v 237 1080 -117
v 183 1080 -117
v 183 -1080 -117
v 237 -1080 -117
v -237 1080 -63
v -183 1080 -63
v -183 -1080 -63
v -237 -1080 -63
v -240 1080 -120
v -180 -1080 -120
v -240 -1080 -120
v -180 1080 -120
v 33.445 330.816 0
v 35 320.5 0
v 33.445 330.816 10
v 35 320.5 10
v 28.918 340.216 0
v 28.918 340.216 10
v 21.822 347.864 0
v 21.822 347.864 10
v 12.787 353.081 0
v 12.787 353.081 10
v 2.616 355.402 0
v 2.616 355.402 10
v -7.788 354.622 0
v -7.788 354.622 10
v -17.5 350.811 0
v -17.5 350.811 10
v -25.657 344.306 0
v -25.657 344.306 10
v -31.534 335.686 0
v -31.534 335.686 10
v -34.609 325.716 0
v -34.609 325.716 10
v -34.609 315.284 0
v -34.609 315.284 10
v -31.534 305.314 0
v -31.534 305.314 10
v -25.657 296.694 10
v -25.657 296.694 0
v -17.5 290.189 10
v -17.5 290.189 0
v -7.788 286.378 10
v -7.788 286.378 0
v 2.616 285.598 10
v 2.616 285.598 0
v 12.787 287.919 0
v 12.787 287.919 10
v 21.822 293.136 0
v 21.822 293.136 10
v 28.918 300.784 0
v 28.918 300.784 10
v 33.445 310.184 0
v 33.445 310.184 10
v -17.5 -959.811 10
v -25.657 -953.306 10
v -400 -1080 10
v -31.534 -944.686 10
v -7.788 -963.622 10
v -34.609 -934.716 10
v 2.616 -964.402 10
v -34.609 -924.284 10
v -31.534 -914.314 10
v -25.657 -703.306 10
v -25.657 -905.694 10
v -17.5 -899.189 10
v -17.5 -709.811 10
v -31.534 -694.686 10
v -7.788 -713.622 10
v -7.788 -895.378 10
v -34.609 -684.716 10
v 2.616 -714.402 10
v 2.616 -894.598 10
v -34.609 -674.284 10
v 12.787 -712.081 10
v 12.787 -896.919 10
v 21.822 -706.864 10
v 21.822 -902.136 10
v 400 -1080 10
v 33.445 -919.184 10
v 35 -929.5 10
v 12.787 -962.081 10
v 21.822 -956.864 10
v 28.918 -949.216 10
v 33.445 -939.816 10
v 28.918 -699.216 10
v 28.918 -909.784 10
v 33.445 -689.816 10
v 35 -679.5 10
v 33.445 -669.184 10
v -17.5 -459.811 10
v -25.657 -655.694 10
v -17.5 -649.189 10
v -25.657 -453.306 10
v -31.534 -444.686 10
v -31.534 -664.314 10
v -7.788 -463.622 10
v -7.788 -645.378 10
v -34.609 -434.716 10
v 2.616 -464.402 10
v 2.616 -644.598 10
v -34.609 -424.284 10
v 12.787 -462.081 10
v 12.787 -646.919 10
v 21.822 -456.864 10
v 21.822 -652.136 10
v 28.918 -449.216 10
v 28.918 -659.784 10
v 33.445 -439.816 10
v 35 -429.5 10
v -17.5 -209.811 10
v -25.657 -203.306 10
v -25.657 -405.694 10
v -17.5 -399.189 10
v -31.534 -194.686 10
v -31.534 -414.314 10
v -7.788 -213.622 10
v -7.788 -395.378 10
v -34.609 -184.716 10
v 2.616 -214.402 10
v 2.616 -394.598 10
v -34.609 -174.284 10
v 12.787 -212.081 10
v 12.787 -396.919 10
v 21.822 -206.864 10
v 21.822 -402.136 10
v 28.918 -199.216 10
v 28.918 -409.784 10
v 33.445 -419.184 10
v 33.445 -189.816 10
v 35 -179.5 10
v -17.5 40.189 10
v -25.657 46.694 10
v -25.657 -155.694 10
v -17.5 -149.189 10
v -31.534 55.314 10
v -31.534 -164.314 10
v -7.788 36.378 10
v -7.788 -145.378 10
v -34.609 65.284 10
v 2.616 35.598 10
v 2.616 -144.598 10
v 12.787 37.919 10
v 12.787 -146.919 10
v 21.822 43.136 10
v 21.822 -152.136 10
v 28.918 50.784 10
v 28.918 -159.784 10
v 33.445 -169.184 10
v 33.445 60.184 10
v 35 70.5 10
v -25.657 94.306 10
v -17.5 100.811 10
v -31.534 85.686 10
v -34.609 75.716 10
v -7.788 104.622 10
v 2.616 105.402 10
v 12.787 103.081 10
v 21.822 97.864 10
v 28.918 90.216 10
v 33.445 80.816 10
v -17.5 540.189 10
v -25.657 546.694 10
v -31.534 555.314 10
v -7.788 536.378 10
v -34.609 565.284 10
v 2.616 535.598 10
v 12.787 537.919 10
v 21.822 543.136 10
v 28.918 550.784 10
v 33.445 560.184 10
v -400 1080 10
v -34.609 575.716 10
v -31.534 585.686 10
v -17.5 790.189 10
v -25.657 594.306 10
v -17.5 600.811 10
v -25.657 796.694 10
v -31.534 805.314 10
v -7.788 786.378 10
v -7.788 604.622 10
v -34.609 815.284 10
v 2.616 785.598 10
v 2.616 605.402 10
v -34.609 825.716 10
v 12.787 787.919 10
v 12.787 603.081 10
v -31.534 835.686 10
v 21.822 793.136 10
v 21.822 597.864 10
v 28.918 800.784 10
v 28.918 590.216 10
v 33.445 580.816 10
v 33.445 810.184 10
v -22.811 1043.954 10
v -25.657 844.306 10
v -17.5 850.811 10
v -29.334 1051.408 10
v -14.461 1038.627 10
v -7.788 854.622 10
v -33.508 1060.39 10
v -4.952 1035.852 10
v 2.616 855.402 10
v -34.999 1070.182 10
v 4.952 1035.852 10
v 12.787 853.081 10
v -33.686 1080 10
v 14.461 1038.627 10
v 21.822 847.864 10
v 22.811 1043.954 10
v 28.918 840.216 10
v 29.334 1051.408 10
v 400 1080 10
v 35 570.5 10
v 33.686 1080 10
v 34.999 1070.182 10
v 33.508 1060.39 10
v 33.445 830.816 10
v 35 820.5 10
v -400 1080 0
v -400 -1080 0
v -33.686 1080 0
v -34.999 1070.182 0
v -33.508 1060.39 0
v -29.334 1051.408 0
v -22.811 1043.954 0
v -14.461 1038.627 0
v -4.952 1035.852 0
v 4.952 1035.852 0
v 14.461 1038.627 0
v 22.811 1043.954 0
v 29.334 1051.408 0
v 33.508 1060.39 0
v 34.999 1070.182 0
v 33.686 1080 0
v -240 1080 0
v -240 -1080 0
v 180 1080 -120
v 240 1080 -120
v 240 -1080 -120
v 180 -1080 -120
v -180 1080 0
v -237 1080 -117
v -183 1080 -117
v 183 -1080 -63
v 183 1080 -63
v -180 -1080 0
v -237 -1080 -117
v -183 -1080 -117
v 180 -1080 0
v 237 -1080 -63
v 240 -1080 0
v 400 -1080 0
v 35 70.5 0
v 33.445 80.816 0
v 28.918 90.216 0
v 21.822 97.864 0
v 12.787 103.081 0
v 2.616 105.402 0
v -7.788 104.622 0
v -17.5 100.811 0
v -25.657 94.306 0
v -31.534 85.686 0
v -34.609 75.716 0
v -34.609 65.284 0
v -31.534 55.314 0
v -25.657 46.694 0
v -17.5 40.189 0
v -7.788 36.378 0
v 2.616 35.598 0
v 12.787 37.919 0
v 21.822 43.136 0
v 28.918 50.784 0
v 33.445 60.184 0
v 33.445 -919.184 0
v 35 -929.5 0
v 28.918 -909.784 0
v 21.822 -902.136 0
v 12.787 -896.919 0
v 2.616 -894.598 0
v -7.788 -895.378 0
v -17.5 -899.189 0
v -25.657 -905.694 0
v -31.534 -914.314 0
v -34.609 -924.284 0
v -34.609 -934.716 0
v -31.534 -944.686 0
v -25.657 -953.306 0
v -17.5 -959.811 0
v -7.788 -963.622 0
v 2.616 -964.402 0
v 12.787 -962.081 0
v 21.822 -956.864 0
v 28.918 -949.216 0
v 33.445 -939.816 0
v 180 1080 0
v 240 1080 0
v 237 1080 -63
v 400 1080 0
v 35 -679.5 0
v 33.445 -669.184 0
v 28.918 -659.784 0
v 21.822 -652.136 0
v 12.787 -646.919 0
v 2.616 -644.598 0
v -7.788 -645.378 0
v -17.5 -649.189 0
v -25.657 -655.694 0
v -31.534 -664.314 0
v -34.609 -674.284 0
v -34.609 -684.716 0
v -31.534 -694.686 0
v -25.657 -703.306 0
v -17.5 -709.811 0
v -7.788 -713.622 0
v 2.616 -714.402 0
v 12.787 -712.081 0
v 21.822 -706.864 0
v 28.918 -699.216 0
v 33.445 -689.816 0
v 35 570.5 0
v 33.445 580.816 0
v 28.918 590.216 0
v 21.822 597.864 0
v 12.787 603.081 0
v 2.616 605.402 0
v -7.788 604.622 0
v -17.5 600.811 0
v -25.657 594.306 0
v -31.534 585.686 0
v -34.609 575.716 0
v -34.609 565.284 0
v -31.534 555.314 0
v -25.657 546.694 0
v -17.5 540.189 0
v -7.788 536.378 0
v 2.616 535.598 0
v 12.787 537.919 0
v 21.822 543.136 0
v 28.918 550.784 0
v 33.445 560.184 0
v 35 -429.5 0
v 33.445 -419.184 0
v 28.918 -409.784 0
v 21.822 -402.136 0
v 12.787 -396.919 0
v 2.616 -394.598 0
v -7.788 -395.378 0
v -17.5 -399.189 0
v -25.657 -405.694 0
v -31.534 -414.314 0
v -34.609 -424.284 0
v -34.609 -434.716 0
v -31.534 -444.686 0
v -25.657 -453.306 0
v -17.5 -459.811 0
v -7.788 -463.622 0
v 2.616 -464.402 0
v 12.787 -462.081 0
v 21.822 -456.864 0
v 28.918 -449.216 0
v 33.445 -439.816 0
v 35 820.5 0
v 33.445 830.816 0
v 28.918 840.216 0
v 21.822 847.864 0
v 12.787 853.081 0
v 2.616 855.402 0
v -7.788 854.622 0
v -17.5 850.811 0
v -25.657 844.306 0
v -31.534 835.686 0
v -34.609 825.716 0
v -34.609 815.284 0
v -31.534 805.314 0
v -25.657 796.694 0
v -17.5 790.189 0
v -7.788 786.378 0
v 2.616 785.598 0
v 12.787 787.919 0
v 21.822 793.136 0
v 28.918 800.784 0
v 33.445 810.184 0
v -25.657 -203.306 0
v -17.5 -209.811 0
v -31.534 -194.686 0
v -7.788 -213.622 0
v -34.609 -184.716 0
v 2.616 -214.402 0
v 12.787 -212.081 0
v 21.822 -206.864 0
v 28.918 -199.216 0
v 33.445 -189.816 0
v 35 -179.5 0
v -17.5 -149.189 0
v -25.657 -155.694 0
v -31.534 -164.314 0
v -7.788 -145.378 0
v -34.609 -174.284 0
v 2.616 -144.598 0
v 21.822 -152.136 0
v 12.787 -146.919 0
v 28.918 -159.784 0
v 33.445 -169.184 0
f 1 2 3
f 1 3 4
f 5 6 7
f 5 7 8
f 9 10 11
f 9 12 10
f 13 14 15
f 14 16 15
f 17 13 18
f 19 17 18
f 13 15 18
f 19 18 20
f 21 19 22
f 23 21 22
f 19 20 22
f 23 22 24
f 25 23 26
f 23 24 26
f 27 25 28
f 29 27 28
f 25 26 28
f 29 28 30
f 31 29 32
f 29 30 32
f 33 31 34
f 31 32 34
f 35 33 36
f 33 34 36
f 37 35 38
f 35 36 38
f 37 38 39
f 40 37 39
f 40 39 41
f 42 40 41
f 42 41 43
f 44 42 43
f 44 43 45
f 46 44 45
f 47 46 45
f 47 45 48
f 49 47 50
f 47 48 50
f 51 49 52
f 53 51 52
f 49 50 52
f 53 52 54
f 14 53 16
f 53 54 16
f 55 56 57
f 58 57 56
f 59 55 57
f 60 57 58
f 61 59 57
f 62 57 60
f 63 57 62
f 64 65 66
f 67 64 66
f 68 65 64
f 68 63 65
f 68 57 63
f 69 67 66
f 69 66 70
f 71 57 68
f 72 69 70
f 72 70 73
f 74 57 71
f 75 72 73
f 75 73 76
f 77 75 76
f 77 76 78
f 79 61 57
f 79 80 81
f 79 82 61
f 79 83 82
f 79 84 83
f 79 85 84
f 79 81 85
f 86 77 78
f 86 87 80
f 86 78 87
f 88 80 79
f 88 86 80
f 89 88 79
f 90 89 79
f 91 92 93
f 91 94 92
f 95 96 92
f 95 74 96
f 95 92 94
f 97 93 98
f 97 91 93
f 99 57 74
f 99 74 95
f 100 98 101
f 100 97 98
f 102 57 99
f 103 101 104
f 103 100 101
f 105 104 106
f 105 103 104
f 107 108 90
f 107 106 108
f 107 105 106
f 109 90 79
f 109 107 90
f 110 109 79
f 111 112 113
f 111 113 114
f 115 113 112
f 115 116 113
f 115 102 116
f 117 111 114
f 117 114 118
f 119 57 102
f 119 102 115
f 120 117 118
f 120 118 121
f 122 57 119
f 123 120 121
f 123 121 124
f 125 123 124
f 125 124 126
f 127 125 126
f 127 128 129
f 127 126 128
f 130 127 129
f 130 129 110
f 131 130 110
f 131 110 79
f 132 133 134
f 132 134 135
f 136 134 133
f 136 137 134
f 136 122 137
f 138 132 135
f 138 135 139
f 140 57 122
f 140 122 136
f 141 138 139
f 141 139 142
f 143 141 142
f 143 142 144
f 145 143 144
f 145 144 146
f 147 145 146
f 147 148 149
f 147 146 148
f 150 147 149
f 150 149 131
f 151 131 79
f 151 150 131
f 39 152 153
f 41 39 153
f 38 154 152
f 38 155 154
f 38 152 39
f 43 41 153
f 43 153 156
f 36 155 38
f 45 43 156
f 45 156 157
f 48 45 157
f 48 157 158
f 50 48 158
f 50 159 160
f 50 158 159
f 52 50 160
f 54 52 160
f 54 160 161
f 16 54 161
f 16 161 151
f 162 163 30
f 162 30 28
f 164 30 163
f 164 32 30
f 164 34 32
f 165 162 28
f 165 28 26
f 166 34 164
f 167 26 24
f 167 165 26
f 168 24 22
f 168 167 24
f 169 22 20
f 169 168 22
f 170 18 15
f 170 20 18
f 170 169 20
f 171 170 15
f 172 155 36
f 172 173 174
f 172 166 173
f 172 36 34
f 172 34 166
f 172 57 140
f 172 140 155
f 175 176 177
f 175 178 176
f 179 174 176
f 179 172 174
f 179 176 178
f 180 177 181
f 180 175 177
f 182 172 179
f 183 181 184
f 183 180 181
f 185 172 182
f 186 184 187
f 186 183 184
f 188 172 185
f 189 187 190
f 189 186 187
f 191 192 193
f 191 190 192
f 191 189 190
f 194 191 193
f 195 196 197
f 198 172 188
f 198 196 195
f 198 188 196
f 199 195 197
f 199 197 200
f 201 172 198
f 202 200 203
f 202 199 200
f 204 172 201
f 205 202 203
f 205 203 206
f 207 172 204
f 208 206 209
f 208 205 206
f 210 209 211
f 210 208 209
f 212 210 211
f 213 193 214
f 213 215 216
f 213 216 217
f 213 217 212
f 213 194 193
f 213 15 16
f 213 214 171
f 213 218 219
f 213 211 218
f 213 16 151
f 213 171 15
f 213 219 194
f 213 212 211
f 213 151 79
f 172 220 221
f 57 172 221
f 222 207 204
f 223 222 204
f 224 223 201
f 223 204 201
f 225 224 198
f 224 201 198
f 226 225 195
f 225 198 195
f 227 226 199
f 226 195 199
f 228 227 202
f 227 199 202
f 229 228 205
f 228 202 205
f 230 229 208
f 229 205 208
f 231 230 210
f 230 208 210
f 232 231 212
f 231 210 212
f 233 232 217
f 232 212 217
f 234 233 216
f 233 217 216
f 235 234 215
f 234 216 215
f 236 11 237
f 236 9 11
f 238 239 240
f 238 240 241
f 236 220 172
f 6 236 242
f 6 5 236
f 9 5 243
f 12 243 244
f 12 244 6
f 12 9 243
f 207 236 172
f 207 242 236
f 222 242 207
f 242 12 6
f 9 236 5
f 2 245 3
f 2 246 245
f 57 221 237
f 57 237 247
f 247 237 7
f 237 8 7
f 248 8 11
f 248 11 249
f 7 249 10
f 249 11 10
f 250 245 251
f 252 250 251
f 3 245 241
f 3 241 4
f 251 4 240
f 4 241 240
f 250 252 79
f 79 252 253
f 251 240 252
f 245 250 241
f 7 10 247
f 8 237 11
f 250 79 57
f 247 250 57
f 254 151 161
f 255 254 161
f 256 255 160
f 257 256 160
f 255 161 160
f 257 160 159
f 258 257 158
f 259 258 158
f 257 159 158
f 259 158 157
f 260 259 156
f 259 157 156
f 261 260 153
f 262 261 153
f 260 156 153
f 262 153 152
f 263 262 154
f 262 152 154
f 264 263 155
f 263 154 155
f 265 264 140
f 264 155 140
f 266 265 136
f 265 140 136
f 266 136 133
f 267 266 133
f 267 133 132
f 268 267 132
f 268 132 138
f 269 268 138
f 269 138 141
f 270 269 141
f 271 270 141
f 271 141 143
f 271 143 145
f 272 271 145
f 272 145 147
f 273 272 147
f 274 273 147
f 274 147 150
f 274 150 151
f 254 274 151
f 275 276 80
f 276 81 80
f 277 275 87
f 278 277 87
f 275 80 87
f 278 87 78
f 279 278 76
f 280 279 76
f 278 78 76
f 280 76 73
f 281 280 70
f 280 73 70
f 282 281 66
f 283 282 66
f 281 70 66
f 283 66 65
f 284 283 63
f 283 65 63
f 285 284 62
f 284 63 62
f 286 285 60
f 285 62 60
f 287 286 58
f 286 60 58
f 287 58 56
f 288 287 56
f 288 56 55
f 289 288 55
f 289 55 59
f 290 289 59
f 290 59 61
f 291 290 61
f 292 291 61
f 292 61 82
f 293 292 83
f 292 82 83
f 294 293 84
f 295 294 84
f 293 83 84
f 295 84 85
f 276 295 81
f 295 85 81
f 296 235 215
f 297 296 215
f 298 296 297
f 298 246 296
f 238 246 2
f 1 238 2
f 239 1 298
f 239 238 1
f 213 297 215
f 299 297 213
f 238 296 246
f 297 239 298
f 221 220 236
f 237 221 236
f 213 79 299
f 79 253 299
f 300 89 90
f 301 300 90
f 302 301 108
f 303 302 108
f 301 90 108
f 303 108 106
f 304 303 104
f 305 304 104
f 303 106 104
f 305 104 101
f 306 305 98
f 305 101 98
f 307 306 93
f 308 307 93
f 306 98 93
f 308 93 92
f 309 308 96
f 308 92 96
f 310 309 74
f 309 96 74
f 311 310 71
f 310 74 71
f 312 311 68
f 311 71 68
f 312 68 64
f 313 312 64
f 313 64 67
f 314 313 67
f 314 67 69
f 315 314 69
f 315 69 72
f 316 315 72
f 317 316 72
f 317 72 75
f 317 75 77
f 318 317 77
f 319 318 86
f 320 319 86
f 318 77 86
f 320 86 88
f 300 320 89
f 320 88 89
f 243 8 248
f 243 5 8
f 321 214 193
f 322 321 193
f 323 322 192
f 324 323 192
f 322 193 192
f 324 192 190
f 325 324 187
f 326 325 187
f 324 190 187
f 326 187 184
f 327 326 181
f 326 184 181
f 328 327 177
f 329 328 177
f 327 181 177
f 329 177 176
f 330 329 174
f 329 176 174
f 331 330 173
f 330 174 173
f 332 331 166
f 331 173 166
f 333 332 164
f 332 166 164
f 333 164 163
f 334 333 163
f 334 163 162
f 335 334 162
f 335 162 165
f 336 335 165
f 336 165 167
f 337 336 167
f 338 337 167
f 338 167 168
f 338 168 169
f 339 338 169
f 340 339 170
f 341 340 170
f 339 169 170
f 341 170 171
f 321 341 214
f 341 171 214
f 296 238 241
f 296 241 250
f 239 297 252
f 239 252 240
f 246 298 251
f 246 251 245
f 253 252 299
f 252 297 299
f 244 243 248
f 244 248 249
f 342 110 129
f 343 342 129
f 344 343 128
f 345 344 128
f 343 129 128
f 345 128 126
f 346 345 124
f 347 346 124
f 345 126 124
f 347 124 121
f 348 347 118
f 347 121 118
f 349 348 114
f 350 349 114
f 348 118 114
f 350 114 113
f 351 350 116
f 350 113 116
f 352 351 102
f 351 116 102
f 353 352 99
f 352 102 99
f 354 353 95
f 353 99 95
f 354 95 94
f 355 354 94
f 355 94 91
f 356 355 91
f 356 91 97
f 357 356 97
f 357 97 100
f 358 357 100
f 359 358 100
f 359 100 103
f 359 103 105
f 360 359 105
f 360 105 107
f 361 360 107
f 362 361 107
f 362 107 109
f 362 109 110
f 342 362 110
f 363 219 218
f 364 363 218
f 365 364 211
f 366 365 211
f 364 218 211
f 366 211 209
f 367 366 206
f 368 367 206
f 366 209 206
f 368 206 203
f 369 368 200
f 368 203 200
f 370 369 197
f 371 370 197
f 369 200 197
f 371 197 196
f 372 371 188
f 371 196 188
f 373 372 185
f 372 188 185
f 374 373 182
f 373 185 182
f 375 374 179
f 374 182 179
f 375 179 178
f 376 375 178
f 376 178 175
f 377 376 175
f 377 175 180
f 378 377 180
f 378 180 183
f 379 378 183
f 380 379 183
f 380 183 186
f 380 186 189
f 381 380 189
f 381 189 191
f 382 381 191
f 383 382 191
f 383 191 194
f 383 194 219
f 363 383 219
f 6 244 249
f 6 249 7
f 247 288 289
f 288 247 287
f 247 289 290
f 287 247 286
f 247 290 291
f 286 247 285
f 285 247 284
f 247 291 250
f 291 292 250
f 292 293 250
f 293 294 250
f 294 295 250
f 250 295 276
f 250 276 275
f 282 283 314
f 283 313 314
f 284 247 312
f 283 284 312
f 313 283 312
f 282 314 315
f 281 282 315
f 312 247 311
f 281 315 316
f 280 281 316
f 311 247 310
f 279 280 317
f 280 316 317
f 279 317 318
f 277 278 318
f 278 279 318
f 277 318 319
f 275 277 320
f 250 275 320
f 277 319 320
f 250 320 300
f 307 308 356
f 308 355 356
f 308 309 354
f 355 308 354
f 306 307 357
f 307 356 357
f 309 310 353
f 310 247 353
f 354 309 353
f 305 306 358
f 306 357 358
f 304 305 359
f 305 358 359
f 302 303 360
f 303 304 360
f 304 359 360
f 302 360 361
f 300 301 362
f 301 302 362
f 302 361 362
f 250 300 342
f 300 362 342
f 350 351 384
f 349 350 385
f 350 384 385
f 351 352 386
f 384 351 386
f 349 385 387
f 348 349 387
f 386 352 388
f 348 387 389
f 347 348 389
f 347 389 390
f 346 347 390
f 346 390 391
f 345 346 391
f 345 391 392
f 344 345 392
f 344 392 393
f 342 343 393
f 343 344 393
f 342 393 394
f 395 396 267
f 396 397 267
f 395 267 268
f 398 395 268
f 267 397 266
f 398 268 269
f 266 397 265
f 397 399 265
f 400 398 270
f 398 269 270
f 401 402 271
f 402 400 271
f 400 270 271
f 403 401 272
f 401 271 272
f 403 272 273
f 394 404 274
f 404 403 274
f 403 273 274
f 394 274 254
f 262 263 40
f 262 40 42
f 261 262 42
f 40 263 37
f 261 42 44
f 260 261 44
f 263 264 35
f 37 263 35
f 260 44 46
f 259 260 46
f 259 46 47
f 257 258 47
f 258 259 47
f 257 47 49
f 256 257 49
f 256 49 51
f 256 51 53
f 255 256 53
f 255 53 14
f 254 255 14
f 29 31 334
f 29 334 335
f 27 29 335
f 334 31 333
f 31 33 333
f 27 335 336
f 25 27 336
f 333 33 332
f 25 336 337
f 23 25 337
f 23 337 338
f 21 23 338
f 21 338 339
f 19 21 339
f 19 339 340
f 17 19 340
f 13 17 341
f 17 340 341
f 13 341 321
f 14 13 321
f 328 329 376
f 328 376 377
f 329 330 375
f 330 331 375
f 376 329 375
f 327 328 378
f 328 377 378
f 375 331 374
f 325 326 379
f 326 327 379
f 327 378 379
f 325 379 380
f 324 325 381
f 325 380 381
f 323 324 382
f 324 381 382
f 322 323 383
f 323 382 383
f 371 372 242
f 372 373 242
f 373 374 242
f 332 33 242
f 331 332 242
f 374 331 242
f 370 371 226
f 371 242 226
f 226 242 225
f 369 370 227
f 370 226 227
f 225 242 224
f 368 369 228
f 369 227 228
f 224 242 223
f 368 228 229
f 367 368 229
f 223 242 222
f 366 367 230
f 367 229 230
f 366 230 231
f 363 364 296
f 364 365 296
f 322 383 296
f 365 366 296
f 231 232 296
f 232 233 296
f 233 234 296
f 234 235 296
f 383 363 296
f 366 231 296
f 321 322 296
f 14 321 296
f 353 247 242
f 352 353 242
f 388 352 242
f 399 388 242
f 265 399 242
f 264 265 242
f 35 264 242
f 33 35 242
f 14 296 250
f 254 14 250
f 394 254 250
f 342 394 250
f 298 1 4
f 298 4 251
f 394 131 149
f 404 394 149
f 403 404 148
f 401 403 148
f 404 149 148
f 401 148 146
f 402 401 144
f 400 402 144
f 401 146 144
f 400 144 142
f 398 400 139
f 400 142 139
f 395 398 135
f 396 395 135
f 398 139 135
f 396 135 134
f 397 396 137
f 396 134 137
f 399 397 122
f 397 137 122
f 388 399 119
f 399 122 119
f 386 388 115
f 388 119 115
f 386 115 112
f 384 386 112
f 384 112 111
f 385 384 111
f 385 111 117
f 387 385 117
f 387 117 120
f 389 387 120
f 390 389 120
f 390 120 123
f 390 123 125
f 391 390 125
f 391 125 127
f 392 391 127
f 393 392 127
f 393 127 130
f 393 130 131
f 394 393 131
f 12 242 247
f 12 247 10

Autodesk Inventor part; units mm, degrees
ref_plane "YZ Plane" through (0, 0, 0) normal (1, 0, 0) x (0, 1, 0)
ref_plane "XZ Plane" through (0, 0, 0) normal (0, 1, 0) x (-1, 0, 0)
ref_plane "XY Plane" through (0, 0, 0) normal (0, 0, 1) x (1, 0, 0)
sketch "Sketch1" plane through (0, 0, 0) normal (0, 0, 1) x (1, 0, 0)
  line L0 (-400, -1080) -> (400, -1080)
  line L1 (400, -1080) -> (400, 1080)
  line L2 (400, 1080) -> (-400, 1080)
  line L3 (-400, 1080) -> (-400, -1080)
  line L4 (-400, -1080) -> (400, 1080) construction
  line L5 (400, -1080) -> (-400, 1080) construction
  point P0 (0, 0)
  dimension "d0" = 800
  dimension "d1" = 2160
extrude "Plate1" add sketch "Sketch1" along normal blind 10
sketch "Sketch2" plane through (0, 0, 10) normal (0, 0, 1) x (1, 0, 0)
  line L0 (400, -1080) -> (-400, -1080) projected
  line L1 (400, 1080) -> (400, -1080) projected
  line L2 (-400, 1080) -> (400, 1080) projected
  line L3 (-400, -1080) -> (-400, 1080) projected
  circle A0 centre (0, -929.5) radius 35
  point P0 (0, 0)
  point P1 (0, -1080)
  dimension "d3" = 70
  dimension "d4" = 150.5
extrude "Extrusion1" cut sketch "Sketch2" against normal through all contours A0
pattern_linear "Rectangular Pattern1" count 9 spacing 250 along (0, 1, 0) of "Extrusion1"
sketch "Sketch3" plane through (0, 0, 0) normal (0, 0, -1) x (-1, 0, 0)
  line L0 (240, -1080) -> (180, -1080)
  line L1 (180, -1080) -> (180, 1080)
  line L2 (180, 1080) -> (240, 1080)
  line L3 (240, 1080) -> (240, -1080)
  line L4 (-180, -1080) -> (-240, -1080)
  line L5 (-240, -1080) -> (-240, 1080)
  line L6 (-240, 1080) -> (-180, 1080)
  line L7 (-180, 1080) -> (-180, -1080)
  line L8 (0, -1080) -> (0, 1305.1217) construction
  line L9 (400, -1080) -> (-400, -1080) projected
  line L10 (-400, 1080) -> (400, 1080) projected
  point P0 (0, 0)
  dimension "d10" = 60
  dimension "d11" = 360
extrude "Extrusion2" add sketch "Sketch3" along normal blind 60 contours L0 L1 L2 L3 | L4 L5 L6 L7
sketch "Sketch4" plane through (-400, 1080, 10) normal (0, 1, 0) x (1, 0, 0)
  line L0 (160, 70) -> (220, 70) projected
  line L1 (160, 70) -> (220, 70)
  line L2 (220, 70) -> (220, 130)
  line L3 (220, 130) -> (160, 130)
  line L4 (160, 130) -> (160, 70)
  line L5 (163, 127) -> (217, 127)
  line L6 (217, 127) -> (217, 73)
  line L7 (217, 73) -> (163, 73)
  line L8 (163, 73) -> (163, 127)
  point P0 (400, 10)
  dimension "d15" = 60
  dimension "d16" = 3
extrude "Extrusion3" add sketch "Sketch4" against normal up to surface (2160 mm away)
mirror "Mirror1" about plane through (0, 0, 0) normal (1, 0, 0) of "Extrusion3"
equation "\"d2\" = Thickness"
equation "\"BendReliefDepth\" = 0.5 * Thickness"
equation "\"Thickness\" = 10"
properties part number "ДМФ 067 крышка v2.0"
